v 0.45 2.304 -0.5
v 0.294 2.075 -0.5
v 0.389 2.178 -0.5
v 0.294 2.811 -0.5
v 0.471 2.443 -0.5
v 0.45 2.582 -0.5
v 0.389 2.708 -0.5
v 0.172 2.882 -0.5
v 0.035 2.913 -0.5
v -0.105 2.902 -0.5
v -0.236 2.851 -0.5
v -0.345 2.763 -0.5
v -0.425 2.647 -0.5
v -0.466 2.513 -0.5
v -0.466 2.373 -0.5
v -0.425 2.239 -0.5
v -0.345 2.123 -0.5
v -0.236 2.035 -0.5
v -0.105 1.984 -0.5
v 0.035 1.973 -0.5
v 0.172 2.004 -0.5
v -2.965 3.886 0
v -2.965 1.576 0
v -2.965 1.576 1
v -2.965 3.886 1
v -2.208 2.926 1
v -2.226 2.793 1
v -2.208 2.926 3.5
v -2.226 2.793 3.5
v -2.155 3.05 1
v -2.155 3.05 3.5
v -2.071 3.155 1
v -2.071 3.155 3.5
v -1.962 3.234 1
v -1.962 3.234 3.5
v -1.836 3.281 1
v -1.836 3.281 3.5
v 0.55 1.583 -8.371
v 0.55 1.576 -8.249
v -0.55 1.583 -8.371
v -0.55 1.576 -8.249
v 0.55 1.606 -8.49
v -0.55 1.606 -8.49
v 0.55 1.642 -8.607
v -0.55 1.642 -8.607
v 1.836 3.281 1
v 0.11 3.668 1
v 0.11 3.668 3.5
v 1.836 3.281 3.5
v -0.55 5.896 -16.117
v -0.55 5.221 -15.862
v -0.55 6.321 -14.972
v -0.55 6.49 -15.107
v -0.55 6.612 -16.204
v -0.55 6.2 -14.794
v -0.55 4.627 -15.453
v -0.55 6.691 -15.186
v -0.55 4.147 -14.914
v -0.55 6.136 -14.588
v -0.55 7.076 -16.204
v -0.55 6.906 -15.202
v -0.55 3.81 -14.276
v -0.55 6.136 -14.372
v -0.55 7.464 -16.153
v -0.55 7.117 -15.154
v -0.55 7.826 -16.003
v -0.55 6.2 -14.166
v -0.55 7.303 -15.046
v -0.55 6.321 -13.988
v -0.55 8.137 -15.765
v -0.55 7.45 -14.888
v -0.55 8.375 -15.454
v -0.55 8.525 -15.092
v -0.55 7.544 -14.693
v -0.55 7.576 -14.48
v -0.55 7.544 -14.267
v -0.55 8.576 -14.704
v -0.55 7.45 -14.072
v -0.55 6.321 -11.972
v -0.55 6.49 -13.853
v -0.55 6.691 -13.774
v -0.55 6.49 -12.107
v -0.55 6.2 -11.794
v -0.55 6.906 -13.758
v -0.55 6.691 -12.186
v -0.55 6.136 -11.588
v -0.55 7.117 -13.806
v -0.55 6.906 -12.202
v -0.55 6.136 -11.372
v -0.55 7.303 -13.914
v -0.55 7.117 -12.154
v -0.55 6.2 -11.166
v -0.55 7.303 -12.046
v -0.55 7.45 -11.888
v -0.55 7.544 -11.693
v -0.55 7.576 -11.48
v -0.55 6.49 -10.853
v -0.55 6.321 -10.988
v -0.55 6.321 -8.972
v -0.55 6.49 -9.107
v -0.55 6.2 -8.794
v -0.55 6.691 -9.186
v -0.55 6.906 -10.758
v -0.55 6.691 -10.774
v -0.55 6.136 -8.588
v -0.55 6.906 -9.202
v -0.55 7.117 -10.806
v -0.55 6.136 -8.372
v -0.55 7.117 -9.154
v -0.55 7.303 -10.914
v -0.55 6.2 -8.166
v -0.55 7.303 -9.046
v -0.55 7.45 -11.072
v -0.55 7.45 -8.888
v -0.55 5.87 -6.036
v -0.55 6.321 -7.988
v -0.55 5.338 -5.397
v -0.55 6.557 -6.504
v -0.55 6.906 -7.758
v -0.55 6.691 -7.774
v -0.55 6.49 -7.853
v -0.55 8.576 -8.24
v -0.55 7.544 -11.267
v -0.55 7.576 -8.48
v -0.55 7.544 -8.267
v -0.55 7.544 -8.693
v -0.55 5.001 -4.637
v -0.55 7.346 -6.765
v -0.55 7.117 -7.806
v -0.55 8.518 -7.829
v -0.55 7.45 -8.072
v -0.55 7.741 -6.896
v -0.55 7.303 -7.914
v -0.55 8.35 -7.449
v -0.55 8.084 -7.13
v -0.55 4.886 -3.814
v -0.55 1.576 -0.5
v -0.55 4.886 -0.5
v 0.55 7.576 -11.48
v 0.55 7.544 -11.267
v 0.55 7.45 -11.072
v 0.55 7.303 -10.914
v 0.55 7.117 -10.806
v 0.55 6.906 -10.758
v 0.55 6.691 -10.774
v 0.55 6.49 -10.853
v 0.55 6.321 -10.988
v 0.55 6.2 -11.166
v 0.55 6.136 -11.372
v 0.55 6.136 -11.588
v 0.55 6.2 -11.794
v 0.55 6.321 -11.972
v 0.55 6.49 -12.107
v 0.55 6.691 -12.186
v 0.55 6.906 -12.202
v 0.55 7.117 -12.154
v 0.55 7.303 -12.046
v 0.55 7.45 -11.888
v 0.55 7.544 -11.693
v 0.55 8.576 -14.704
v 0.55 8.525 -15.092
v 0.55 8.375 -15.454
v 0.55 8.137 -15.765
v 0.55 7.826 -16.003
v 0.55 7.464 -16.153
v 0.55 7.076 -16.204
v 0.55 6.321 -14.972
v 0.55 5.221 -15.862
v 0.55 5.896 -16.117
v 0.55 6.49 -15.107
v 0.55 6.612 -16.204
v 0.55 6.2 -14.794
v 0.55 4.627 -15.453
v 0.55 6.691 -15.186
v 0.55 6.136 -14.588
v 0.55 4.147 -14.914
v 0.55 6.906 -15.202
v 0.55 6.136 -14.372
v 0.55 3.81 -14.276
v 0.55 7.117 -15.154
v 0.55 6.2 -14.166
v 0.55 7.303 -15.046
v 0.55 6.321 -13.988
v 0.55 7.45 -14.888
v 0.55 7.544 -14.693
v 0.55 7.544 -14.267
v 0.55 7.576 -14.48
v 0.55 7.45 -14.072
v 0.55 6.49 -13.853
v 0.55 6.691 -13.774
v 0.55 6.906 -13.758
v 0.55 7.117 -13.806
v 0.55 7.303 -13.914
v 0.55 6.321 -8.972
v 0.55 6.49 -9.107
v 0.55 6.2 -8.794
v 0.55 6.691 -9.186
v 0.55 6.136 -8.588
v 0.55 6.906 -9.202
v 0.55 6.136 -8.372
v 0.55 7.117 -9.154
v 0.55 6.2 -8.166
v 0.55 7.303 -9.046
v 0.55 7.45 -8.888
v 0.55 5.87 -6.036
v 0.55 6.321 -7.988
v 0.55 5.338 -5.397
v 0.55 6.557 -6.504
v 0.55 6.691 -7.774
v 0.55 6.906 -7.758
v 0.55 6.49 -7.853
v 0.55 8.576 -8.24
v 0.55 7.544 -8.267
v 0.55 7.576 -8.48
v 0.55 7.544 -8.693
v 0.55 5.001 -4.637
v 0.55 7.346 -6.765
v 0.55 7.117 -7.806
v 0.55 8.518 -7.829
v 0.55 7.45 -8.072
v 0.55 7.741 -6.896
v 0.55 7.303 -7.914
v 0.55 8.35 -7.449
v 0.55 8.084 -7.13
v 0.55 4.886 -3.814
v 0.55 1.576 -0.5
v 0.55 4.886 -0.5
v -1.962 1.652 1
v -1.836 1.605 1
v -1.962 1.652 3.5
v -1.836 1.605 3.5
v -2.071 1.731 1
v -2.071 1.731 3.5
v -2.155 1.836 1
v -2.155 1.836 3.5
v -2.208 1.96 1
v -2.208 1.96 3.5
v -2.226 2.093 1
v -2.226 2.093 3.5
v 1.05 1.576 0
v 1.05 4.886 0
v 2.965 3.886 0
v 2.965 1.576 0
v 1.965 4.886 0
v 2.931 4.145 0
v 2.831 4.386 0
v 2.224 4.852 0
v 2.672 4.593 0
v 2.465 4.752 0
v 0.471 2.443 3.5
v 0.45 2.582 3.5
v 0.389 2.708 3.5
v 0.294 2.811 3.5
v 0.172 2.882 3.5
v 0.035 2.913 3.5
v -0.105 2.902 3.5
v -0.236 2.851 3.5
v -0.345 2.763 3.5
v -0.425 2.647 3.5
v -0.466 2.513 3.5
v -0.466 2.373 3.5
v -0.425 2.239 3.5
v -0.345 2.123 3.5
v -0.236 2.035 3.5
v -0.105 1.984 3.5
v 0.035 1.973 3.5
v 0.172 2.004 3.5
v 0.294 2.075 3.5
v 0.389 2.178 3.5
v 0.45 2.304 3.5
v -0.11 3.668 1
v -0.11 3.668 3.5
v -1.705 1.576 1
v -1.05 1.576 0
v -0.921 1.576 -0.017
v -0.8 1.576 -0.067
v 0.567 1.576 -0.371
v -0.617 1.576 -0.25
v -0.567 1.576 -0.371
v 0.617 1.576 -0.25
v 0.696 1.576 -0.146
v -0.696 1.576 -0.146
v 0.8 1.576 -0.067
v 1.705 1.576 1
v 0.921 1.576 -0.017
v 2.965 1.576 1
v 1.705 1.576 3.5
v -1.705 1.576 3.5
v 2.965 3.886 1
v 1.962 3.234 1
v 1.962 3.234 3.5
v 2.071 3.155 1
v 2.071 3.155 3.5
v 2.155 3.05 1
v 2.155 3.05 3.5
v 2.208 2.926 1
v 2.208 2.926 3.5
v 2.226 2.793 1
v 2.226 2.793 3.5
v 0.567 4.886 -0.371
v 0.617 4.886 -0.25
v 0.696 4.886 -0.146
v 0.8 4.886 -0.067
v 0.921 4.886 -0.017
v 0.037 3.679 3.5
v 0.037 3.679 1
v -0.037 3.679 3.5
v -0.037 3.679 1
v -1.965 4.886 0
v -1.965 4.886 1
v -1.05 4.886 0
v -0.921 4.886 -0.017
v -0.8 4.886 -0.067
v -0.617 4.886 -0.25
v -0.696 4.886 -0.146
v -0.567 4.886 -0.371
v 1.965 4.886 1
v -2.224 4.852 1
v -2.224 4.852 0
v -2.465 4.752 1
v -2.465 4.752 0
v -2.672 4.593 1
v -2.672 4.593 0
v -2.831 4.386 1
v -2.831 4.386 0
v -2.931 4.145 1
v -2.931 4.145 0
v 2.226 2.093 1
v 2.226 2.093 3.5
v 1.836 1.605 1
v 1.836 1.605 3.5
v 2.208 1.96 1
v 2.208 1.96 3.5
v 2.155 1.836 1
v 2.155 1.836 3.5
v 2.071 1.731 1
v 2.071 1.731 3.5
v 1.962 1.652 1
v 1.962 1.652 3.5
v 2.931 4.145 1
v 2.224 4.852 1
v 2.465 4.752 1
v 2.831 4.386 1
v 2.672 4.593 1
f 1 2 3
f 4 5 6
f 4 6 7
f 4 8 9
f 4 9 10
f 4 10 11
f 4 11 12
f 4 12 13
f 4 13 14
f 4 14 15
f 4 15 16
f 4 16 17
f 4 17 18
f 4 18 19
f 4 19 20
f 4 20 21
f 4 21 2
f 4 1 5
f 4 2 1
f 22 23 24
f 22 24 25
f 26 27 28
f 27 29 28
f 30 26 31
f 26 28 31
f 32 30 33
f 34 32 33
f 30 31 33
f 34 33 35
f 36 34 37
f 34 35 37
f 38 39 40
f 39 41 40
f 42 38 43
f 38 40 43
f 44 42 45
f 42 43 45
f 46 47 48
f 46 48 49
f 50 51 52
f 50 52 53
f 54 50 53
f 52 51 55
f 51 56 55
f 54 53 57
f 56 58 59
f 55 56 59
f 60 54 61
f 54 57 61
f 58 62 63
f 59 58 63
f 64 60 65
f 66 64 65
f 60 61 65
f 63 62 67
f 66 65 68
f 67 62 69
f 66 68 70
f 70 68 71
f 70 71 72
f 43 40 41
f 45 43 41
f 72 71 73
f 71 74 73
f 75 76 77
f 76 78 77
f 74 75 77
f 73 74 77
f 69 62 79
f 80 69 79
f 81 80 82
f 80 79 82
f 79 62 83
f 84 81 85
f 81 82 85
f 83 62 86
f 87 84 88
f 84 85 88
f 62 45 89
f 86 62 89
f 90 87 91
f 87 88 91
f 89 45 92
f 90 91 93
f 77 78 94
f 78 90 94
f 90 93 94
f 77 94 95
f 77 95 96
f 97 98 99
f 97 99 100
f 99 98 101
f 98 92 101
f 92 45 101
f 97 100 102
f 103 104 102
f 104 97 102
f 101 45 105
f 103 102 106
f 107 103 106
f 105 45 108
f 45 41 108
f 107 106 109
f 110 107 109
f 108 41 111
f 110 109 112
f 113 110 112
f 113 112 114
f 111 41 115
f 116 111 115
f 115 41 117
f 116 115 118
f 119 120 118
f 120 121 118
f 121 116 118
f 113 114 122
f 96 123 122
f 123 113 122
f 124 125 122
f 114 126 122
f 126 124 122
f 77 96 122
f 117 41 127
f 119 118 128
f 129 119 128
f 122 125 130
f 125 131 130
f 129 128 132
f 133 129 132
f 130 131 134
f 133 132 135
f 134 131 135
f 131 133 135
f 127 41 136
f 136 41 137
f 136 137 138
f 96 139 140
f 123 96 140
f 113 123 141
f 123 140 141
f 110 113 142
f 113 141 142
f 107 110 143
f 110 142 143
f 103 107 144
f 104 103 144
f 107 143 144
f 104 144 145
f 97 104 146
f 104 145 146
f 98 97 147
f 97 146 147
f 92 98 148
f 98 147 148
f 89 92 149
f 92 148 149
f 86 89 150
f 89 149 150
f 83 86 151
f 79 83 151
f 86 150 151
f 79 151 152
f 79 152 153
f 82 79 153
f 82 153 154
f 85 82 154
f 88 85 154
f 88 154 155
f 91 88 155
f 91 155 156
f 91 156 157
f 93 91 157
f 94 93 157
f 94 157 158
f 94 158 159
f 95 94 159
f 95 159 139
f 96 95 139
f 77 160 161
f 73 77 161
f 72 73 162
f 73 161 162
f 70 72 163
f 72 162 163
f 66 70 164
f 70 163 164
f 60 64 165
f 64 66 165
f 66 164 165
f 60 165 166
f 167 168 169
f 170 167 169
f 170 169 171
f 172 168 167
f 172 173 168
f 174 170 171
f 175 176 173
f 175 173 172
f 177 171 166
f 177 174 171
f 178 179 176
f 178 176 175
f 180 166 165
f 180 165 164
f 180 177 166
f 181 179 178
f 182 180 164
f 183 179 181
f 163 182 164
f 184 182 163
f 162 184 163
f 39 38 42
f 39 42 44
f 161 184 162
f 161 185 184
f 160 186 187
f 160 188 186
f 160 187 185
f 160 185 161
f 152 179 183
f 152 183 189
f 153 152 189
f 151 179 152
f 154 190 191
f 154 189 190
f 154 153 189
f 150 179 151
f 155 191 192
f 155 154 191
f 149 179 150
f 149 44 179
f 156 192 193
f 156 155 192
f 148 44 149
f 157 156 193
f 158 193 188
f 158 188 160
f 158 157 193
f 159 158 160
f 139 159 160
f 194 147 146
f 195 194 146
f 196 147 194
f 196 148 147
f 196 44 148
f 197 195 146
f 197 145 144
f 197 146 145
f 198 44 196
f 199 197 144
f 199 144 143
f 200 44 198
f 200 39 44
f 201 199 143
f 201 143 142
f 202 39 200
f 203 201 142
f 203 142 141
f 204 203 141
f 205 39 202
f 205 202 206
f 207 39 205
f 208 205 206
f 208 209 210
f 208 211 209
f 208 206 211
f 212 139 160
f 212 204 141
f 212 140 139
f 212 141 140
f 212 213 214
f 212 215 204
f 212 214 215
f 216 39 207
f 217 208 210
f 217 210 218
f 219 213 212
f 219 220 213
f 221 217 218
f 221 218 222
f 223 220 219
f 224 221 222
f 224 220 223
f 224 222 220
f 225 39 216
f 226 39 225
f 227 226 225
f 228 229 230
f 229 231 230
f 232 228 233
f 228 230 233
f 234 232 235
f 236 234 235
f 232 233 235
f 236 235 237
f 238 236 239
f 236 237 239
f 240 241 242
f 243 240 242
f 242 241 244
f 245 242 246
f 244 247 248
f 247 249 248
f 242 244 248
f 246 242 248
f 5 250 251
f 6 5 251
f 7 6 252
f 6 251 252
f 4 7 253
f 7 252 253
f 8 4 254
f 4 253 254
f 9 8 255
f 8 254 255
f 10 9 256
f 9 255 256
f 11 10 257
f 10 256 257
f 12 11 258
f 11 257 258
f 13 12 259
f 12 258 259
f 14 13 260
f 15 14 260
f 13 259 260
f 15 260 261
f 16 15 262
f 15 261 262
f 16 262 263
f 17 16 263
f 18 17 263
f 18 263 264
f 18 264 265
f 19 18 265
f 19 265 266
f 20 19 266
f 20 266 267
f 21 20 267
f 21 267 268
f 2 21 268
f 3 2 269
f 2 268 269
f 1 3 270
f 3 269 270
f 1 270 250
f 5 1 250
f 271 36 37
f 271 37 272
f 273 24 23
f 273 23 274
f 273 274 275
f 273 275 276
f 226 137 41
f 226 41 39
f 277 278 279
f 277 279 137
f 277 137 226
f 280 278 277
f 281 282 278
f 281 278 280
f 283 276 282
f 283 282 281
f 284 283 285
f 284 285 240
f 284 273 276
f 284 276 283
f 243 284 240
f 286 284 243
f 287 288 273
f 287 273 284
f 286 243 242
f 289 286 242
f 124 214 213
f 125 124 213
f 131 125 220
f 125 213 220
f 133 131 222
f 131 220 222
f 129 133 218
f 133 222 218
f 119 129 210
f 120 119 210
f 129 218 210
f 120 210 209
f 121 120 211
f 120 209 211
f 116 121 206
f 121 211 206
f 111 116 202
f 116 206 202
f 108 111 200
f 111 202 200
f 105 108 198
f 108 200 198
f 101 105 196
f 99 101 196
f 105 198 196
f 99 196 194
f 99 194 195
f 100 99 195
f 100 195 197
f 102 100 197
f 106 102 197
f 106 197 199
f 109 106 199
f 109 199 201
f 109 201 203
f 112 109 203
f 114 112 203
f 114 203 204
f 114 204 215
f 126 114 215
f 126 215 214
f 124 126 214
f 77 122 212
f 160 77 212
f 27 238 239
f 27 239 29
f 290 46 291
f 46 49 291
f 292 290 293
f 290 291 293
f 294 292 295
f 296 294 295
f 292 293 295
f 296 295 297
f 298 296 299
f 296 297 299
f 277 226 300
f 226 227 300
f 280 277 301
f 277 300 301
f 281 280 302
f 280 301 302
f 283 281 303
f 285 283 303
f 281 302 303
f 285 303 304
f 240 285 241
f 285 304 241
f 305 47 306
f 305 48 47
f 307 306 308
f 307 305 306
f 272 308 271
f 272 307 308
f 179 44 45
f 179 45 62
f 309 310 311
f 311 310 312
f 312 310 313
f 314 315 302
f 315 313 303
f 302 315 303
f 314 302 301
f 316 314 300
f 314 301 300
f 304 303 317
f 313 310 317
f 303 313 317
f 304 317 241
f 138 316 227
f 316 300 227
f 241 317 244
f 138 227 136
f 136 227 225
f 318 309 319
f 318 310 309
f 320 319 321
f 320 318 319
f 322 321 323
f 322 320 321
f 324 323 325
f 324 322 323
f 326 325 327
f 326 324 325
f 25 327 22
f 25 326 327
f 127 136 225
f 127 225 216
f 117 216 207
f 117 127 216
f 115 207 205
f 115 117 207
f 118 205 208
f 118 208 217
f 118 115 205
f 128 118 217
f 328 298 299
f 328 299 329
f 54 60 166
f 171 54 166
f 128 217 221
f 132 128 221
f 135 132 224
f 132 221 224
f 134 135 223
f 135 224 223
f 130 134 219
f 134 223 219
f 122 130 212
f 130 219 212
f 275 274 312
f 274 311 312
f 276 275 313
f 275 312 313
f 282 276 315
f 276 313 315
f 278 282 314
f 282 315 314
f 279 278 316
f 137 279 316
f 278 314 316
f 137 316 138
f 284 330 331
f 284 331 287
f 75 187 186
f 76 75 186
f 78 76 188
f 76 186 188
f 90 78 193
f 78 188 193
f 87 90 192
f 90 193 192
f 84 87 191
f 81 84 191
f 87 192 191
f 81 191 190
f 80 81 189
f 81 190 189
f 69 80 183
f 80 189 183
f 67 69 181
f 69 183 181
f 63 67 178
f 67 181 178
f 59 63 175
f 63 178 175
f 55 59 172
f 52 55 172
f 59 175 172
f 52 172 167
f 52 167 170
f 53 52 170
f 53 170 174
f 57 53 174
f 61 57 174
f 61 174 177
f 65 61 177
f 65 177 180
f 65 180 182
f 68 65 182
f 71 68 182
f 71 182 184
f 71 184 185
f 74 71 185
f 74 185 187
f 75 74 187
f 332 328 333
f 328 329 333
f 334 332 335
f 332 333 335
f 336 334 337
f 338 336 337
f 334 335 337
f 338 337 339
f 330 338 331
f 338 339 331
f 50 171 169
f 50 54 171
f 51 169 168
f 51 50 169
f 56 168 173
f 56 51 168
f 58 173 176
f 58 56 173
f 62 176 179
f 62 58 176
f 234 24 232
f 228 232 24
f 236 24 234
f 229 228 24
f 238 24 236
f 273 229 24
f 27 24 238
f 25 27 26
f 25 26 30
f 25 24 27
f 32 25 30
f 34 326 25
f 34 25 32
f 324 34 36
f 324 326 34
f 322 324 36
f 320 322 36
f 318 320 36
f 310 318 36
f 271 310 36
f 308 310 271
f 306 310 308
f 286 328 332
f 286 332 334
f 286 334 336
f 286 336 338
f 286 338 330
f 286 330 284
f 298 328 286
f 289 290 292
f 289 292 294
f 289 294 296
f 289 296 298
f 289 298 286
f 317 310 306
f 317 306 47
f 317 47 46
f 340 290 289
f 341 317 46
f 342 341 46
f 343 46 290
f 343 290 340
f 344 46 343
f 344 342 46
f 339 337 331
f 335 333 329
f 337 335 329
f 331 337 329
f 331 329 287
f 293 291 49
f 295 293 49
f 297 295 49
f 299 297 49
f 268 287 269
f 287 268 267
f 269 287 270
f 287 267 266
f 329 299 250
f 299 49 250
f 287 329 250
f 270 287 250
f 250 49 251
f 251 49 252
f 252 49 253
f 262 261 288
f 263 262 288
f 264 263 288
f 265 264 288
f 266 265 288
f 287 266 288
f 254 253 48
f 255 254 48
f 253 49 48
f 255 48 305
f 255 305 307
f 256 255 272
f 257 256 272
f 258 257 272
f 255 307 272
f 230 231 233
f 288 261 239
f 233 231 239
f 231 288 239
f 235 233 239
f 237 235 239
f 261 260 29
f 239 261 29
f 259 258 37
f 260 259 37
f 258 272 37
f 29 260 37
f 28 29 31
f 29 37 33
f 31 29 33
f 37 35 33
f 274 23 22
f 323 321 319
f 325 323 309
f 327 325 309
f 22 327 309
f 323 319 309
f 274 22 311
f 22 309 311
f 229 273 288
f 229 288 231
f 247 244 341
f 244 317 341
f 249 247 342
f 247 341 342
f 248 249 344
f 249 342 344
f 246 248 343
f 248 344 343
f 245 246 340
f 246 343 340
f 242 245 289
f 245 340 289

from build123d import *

# Parameters (mm, degrees)
SKETCH3_W                      = 5.93
SKETCH3_H                      = 4.886
MOUNT_BASE_PLATE_DEPTH         = 1
HORN_LEVER_PROFILE_W           = 1.1
HORN_LEVER_PROFILE_H           = 7
LEVER_PROFILE_DEPTH            = 16.204
LOWER_CH_FRONT_DIVOT_W         = 6.814
LOWER_CH_FRONT_DIVOT_H         = 3.69
FRONT_BASE_PROFILE_CUT_DEPTH   = 19.667421273
REAR_PROFILE_CUT_DEPTH         = 19.667421273
F_3_HOLES_R                    = 0.7239
F_3_HOLES_CIUT_DEPTH           = 19.667421273
THRU_BASE_MOUNT_TAB_DEPTH      = 2.5
SKETCH9_R                      = 0.47117
THRU_BASE_MOUNT_TAB_HOLE_DEPTH = 4
BASE_PLATE_CORNER_FILLET_R     = 1
FRONT_LEVER_UNDER_FILLET_R     = 3
FRONT_LEVER_TOP_FILLETS_R      = 1.5
REAR_TOP_FILLET_R              = 3
SIDE_BASE_LEVER_ARM_FILLETS_R  = 0.5
THRU_BASE_MOUNT_TAB_FILLETS_R  = 0.5
BOT_MIIDLEVER_ANGLE_FILLET_R   = 1


with BuildPart() as part:
    # Sketch3 → Mount Base Plate (new body)
    with BuildSketch(Plane.XY):
        with Locations((0, 2.443)):
            Rectangle(SKETCH3_W, SKETCH3_H)
    extrude(amount=MOUNT_BASE_PLATE_DEPTH)

    # Horn Lever Profile → Lever Profile (add)
    with BuildSketch(Plane.XY):
        with Locations((0, 5.076)):
            Rectangle(HORN_LEVER_PROFILE_W, HORN_LEVER_PROFILE_H)
    extrude(amount=-LEVER_PROFILE_DEPTH)

    # Lower CH Front Divot → Front Base Profile Cut (cut, through all)
    with BuildSketch(Plane(origin=(0.55, 0, 0), x_dir=(0, 0, -1), z_dir=(1, 0, 0))):
        with Locations((3.407, 6.731)):
            Rectangle(LOWER_CH_FRONT_DIVOT_W, LOWER_CH_FRONT_DIVOT_H)
    extrude(amount=-FRONT_BASE_PROFILE_CUT_DEPTH, mode=Mode.SUBTRACT)

    # Sketch6 → Rear Profile Cut (cut, through all)
    with BuildSketch(Plane(origin=(0.55, 0, 0), x_dir=(0, 0, -1), z_dir=(1, 0, 0))):
        Polygon((8.434, 1.576), (16.204, 4.547737021), (16.204, 1.576), align=None)
    extrude(amount=-REAR_PROFILE_CUT_DEPTH, mode=Mode.SUBTRACT)

    # 3 Holes → 3 Holes Ciut (cut, through all)
    with BuildSketch(Plane(origin=(0.55, 0, 0), x_dir=(0, 0, -1), z_dir=(1, 0, 0))):
        with Locations(Location((14.4801, 6.8521, 0), (0, 0, 90))):
            Circle(F_3_HOLES_R)
        with Locations(Location((11.4801, 6.8521, 0), (0, 0, 90))):
            Circle(F_3_HOLES_R)
        with Locations(Location((8.4801, 6.8521, 0), (0, 0, 90))):
            Circle(F_3_HOLES_R)
    extrude(amount=-F_3_HOLES_CIUT_DEPTH, mode=Mode.SUBTRACT)

    # Thru Surface Base Ext → Thru Base Mount Tab (add)
    with BuildSketch(Plane.XY.offset(1)):
        Polygon((0, 3.693), (2.226, 3.193), (2.226, 1.693), (0, 1.193), (-2.226, 1.693), (-2.226, 3.193), align=None)
    extrude(amount=THRU_BASE_MOUNT_TAB_DEPTH)

    # Sketch9 → Thru Base Mount Tab Hole (cut)
    with BuildSketch(Plane.XY.offset(3.5)):
        with Locations((0, 2.443)):
            Circle(SKETCH9_R)
    extrude(amount=-THRU_BASE_MOUNT_TAB_HOLE_DEPTH, mode=Mode.SUBTRACT)

    # Base Plate Corner Fillet
    base_plate_corner_fillet_edges = [part.edges().sort_by_distance(p)[0] for p in [
        (-2.965, 4.886, 0.5),
        (2.965, 4.886, 0.5),
        (2.965, 0, 0.5),
        (-2.965, 0, 0.5),
    ]]
    fillet(base_plate_corner_fillet_edges, radius=BASE_PLATE_CORNER_FILLET_R)

    # Front Lever Under Fillet
    front_lever_under_fillet_edges = [part.edges().sort_by_distance(p)[0] for p in [
        (0, 4.886, -6.814),
    ]]
    fillet(front_lever_under_fillet_edges, radius=FRONT_LEVER_UNDER_FILLET_R)

    # Front Lever Top Fillets
    # the kernel refuses this fillet: 1.5 mm, written as the material it takes off along each edge
    with BuildSketch(Plane(origin=(4.3, 8.576, -16.204), x_dir=(0, 0, 1), z_dir=(-1, 0, 0))) as front_lever_top_fillets_piece_1:
        with BuildLine():
            CenterArc((FRONT_LEVER_TOP_FILLETS_R, -FRONT_LEVER_TOP_FILLETS_R), FRONT_LEVER_TOP_FILLETS_R, 90, 90)
            Line((0, -FRONT_LEVER_TOP_FILLETS_R), (0, 0))
            Line((0, 0), (FRONT_LEVER_TOP_FILLETS_R, 0))
        make_face()
    extrude(amount=8.6, mode=Mode.SUBTRACT)
    with BuildSketch(Plane(origin=(4.116249365, 8.576, -6.814), x_dir=(0, -0.9992074286085749, 0.03980596203384177), z_dir=(-1, 0, 0))) as front_lever_top_fillets_piece_2:
        with BuildLine():
            CenterArc((1.442027948, -1.485078086), FRONT_LEVER_TOP_FILLETS_R, 98.088443448, 79.630240195)
            Line((-0.056783195, -1.425369143), (-0.206664309, -1.419398249))
            Line((-0.206664309, -1.419398249), (-0.149881114, 0.005970894))
            Line((-0.149881114, 0.005970894), (0.005970894, 0.149881114))
            ThreePointArc((0.005970894, 0.149881114), (0.69542402, 0.122415), (1.209870405, 0.148507809))
            Line((1.209870405, 0.148507809), (1.230975636, 0))
        make_face()
    extrude(amount=8.232498729, mode=Mode.SUBTRACT)

    # Rear Top Fillet
    rear_top_fillet_edges = [part.edges().sort_by_distance(p)[0] for p in [
        (0, 4.547737021, -16.204),
    ]]
    fillet(rear_top_fillet_edges, radius=REAR_TOP_FILLET_R)

    # Side Base Lever Arm Fillets
    side_base_lever_arm_fillets_edges = [part.edges().sort_by_distance(p)[0] for p in [
        (-0.55, 3.231, 0),
        (0.55, 3.231, 0),
    ]]
    fillet(side_base_lever_arm_fillets_edges, radius=SIDE_BASE_LEVER_ARM_FILLETS_R)

    # Thru base Mount Tab Fillets
    thru_base_mount_tab_fillets_edges = [part.edges().sort_by_distance(p)[0] for p in [
        (0, 3.693, 2.25),
        (-2.226, 3.193, 2.25),
        (-2.226, 1.693, 2.25),
        (0, 1.193, 2.25),
        (2.226, 1.693, 2.25),
        (2.226, 3.193, 2.25),
    ]]
    fillet(thru_base_mount_tab_fillets_edges, radius=THRU_BASE_MOUNT_TAB_FILLETS_R)

    # Bot MiidLever Angle Fillet
    bot_miidlever_angle_fillet_edges = [part.edges().sort_by_distance(p)[0] for p in [
        (0, 1.576, -8.434),
    ]]
    fillet(bot_miidlever_angle_fillet_edges, radius=BOT_MIIDLEVER_ANGLE_FILLET_R)

    # SurfaceCut1
    split(bisect_by=Plane.XZ.offset(-1.576), keep=Keep.BOTTOM)


solid = part.part
